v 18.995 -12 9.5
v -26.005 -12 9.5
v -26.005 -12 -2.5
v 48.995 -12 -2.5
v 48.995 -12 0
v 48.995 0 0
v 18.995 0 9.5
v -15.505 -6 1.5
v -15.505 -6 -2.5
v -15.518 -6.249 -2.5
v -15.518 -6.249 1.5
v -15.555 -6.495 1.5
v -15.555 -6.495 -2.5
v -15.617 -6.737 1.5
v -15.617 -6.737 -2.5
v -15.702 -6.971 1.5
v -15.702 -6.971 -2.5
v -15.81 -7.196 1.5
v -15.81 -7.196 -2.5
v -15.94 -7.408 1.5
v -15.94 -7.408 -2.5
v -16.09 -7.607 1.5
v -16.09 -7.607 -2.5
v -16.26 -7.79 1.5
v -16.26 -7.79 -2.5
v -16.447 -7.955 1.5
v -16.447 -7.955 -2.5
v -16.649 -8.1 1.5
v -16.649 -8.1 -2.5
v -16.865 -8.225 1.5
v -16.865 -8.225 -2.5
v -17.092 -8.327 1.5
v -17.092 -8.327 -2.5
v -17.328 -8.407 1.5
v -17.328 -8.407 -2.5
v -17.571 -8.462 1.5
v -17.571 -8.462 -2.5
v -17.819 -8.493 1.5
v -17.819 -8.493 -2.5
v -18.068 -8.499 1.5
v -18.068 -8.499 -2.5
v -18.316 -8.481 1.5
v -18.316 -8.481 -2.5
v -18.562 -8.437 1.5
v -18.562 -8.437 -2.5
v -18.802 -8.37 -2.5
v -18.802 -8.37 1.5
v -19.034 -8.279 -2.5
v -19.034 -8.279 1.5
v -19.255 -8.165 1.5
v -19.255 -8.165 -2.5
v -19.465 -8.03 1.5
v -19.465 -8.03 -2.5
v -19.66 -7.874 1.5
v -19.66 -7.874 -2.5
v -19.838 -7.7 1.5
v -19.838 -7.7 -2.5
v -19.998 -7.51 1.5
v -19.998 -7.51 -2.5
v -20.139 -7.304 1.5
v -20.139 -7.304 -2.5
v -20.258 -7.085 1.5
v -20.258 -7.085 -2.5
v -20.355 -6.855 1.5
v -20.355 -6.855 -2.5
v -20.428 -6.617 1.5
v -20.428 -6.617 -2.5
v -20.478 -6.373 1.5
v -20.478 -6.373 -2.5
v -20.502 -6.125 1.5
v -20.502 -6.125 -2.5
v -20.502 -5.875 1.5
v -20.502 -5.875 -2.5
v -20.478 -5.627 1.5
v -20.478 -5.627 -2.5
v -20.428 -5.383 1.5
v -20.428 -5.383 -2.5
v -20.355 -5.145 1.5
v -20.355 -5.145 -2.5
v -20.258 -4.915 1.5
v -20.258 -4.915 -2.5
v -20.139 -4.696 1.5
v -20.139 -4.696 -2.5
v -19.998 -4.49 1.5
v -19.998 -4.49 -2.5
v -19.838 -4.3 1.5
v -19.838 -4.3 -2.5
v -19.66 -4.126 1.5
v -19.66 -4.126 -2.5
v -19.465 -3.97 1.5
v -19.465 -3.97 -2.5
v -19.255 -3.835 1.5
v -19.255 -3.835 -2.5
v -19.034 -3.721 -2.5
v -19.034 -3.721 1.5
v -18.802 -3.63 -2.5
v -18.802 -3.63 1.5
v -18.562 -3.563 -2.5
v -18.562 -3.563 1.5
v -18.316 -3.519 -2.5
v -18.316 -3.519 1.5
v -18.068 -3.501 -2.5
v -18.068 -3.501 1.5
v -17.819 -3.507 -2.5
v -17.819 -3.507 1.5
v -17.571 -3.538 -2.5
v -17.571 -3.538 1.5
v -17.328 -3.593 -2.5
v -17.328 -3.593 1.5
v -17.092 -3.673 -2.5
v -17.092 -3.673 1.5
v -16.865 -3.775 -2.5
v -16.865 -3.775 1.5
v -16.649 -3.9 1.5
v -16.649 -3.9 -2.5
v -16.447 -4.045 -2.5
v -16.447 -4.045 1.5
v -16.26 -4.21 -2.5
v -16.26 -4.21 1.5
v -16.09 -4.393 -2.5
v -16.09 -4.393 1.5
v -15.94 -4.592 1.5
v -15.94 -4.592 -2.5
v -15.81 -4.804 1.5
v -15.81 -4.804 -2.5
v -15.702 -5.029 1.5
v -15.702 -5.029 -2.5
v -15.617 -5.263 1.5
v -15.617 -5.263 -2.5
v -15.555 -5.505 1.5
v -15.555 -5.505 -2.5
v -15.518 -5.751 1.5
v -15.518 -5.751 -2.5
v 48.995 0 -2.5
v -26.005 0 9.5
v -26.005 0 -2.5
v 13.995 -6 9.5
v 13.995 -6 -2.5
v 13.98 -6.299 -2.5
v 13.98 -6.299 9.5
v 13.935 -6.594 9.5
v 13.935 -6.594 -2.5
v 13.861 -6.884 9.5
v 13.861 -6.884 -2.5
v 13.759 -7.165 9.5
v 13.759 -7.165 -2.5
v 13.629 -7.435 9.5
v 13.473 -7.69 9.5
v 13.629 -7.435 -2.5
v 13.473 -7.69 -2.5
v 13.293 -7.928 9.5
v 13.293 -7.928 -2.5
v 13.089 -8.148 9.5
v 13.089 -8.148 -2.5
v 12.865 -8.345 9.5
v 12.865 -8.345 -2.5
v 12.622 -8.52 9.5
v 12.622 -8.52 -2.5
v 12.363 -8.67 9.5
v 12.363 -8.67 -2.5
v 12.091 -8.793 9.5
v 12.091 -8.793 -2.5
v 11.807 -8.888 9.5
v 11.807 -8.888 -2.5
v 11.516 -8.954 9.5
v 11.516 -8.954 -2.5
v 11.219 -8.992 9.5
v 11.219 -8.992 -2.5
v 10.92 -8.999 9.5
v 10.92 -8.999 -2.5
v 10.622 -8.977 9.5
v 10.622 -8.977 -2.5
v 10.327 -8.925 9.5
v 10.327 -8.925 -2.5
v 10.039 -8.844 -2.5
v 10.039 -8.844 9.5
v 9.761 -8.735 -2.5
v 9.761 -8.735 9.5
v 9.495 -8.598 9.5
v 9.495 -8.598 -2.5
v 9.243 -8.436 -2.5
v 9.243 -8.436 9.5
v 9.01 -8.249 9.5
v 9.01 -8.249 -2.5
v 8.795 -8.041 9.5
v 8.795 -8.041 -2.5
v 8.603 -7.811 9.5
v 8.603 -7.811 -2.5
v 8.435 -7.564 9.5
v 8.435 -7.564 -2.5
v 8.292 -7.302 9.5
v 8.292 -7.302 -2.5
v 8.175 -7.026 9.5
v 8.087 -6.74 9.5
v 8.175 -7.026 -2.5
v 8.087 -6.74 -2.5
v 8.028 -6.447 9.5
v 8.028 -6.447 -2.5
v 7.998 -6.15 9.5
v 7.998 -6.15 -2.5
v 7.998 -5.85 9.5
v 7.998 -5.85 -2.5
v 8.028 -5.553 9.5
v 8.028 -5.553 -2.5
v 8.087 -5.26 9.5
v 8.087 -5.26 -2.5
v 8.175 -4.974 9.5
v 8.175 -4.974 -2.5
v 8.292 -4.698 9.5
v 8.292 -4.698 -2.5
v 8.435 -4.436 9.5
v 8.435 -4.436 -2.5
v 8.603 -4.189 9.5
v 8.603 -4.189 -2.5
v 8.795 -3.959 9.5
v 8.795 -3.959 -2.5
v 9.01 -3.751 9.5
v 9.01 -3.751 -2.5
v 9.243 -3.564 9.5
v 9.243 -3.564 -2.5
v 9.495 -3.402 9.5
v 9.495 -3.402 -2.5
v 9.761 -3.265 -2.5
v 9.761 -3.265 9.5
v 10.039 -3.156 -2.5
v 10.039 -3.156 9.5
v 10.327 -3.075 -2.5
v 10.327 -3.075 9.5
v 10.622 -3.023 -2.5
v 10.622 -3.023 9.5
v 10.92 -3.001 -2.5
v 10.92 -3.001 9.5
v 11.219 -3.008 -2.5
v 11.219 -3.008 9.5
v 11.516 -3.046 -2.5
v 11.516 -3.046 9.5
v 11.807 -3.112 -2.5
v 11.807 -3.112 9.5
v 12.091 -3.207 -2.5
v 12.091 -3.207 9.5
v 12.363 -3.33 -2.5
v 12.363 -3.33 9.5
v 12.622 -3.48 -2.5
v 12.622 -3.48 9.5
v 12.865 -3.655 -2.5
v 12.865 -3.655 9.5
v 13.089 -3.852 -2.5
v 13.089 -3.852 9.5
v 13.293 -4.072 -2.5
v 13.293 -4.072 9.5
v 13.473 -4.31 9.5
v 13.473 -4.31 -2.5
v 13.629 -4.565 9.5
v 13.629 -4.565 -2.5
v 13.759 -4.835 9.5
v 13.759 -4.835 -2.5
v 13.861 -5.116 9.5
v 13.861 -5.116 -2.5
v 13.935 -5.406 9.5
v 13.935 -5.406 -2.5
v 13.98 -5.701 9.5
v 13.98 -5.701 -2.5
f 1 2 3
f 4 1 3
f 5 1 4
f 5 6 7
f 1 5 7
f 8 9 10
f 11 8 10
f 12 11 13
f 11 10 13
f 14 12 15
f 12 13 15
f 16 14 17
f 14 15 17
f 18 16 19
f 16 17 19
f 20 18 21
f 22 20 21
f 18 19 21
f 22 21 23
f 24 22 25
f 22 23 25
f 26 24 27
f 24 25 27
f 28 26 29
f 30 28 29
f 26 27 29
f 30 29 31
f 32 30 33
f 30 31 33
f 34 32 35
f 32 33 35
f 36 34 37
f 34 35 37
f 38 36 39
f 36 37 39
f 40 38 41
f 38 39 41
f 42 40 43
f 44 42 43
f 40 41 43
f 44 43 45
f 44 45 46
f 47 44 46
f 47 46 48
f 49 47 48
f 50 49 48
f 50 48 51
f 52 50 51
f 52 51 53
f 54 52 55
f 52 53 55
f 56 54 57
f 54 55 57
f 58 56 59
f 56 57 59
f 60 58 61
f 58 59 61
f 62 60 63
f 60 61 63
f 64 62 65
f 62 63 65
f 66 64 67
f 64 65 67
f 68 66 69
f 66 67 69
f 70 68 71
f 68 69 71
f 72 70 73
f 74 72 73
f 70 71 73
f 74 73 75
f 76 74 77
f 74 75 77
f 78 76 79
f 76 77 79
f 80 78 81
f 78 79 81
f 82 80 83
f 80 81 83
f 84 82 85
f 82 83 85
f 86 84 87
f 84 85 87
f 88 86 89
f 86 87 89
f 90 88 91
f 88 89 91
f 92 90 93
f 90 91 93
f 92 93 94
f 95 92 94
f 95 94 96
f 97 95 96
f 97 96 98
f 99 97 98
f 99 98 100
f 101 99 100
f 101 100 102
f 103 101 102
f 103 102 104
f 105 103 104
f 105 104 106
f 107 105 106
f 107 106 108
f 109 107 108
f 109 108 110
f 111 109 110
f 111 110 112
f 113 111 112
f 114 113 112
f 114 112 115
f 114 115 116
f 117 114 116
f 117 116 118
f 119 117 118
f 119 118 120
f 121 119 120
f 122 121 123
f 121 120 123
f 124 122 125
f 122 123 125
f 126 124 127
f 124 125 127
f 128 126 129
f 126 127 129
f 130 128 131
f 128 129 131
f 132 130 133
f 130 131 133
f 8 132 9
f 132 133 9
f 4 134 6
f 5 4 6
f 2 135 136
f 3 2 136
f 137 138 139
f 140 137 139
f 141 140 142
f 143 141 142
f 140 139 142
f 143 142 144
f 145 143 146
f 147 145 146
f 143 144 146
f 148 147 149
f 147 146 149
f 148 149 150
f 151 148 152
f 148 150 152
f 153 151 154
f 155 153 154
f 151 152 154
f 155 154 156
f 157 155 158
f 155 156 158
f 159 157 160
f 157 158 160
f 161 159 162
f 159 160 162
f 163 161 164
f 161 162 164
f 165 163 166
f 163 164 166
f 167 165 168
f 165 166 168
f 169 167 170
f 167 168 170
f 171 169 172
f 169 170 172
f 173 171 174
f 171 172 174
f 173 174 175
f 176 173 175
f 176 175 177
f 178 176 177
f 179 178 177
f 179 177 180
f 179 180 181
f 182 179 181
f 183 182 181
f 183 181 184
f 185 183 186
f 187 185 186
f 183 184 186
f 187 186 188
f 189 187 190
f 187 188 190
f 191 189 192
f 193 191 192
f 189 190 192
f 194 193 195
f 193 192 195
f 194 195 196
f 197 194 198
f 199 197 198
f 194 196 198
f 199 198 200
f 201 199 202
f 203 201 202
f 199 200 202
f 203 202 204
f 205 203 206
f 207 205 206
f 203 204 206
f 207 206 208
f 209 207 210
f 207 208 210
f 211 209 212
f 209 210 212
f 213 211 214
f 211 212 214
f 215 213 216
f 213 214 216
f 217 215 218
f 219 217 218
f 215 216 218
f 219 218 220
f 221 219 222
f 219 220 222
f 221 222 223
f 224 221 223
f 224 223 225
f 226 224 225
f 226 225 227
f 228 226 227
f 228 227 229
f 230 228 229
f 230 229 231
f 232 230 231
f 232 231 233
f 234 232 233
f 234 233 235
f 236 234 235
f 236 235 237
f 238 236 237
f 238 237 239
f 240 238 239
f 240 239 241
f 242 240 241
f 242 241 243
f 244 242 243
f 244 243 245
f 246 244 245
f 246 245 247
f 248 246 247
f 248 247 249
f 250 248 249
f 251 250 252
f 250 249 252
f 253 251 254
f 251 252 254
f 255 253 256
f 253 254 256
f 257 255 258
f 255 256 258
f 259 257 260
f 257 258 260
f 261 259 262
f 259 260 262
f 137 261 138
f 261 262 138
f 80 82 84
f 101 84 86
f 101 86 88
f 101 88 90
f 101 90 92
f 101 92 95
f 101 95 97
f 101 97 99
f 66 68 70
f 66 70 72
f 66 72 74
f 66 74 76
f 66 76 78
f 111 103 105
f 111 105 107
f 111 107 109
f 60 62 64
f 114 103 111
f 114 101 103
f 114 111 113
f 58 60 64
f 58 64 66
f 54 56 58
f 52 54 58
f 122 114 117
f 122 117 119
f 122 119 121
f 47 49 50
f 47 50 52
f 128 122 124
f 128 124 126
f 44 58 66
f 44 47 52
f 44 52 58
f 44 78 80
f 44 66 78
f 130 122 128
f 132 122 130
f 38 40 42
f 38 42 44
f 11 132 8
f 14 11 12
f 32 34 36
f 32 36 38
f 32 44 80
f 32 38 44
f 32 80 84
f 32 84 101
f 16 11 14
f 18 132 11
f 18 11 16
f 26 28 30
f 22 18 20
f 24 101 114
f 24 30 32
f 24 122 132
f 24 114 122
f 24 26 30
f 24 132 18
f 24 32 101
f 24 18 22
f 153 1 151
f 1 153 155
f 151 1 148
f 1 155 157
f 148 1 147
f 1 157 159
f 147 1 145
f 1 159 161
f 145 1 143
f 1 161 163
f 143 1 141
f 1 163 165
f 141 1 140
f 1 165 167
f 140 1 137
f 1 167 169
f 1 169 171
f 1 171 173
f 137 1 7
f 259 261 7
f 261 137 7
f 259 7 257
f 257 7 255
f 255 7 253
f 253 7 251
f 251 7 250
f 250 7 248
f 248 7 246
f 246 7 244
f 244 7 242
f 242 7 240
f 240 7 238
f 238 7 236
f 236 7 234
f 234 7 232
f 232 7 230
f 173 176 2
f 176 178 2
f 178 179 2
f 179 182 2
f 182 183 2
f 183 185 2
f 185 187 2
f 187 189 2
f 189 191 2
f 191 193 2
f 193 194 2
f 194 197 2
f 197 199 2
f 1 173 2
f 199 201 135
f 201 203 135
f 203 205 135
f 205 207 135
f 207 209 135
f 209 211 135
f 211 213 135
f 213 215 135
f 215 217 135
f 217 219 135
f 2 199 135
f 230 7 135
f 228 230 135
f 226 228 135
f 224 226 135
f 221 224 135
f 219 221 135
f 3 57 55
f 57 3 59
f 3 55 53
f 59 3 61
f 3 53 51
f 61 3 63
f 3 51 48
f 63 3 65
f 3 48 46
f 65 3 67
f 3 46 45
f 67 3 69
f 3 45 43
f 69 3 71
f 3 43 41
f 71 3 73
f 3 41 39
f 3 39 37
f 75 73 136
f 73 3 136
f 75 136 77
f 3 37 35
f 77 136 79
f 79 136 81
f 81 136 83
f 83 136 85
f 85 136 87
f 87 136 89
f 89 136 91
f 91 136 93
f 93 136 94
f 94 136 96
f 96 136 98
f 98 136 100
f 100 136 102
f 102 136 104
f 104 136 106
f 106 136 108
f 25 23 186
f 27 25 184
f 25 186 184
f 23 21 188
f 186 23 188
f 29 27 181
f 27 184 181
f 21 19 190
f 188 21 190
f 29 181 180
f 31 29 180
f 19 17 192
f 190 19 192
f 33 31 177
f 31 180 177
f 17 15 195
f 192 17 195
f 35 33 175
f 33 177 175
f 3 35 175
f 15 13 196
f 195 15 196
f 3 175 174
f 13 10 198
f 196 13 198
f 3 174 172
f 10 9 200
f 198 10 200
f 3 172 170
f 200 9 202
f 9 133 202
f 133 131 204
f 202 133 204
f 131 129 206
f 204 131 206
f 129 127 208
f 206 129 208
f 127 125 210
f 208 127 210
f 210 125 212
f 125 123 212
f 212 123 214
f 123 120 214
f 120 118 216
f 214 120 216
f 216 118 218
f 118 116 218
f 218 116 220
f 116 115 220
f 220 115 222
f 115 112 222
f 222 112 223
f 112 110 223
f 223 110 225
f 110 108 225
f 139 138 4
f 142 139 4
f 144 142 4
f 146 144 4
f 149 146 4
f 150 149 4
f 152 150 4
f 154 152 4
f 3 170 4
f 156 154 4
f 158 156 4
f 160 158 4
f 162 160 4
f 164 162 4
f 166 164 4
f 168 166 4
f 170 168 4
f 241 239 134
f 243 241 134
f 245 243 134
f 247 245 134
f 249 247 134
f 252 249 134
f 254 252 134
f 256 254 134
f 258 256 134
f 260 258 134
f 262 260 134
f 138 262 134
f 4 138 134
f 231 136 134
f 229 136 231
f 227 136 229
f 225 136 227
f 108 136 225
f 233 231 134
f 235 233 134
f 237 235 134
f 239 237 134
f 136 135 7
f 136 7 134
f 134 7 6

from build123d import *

# Parameters (mm, degrees)
F1_DEPTH = 12
F2_R     = 2.5
F3_DEPTH = 4
F4_R     = 3
F5_DEPTH = 12


with BuildPart() as f1:
    # F0 (on Front) → F1 (new body)
    with BuildSketch(Plane.XZ):
        Polygon((18.994565, 9.5), (-26.005435, 9.5), (-26.005435, -2.5), (48.994565, -2.5), (48.994565, 0), align=None)
    extrude(amount=F1_DEPTH)

    # F2 (on face) → F3 (cut)
    with BuildSketch(Plane(origin=(0, 0, -2.5), x_dir=(1, 0, 0), z_dir=(0, 0, -1))):
        with Locations((-18.005435, 6)):
            Circle(F2_R)
    extrude(amount=-F3_DEPTH, mode=Mode.SUBTRACT)

    # F4 (on face) → F5 (cut)
    with BuildSketch(Plane(origin=(0, 0, -2.5), x_dir=(1, 0, 0), z_dir=(0, 0, -1))):
        with Locations((10.994565, 6)):
            Circle(F4_R)
    extrude(amount=-F5_DEPTH, mode=Mode.SUBTRACT)


solid = f1.part
